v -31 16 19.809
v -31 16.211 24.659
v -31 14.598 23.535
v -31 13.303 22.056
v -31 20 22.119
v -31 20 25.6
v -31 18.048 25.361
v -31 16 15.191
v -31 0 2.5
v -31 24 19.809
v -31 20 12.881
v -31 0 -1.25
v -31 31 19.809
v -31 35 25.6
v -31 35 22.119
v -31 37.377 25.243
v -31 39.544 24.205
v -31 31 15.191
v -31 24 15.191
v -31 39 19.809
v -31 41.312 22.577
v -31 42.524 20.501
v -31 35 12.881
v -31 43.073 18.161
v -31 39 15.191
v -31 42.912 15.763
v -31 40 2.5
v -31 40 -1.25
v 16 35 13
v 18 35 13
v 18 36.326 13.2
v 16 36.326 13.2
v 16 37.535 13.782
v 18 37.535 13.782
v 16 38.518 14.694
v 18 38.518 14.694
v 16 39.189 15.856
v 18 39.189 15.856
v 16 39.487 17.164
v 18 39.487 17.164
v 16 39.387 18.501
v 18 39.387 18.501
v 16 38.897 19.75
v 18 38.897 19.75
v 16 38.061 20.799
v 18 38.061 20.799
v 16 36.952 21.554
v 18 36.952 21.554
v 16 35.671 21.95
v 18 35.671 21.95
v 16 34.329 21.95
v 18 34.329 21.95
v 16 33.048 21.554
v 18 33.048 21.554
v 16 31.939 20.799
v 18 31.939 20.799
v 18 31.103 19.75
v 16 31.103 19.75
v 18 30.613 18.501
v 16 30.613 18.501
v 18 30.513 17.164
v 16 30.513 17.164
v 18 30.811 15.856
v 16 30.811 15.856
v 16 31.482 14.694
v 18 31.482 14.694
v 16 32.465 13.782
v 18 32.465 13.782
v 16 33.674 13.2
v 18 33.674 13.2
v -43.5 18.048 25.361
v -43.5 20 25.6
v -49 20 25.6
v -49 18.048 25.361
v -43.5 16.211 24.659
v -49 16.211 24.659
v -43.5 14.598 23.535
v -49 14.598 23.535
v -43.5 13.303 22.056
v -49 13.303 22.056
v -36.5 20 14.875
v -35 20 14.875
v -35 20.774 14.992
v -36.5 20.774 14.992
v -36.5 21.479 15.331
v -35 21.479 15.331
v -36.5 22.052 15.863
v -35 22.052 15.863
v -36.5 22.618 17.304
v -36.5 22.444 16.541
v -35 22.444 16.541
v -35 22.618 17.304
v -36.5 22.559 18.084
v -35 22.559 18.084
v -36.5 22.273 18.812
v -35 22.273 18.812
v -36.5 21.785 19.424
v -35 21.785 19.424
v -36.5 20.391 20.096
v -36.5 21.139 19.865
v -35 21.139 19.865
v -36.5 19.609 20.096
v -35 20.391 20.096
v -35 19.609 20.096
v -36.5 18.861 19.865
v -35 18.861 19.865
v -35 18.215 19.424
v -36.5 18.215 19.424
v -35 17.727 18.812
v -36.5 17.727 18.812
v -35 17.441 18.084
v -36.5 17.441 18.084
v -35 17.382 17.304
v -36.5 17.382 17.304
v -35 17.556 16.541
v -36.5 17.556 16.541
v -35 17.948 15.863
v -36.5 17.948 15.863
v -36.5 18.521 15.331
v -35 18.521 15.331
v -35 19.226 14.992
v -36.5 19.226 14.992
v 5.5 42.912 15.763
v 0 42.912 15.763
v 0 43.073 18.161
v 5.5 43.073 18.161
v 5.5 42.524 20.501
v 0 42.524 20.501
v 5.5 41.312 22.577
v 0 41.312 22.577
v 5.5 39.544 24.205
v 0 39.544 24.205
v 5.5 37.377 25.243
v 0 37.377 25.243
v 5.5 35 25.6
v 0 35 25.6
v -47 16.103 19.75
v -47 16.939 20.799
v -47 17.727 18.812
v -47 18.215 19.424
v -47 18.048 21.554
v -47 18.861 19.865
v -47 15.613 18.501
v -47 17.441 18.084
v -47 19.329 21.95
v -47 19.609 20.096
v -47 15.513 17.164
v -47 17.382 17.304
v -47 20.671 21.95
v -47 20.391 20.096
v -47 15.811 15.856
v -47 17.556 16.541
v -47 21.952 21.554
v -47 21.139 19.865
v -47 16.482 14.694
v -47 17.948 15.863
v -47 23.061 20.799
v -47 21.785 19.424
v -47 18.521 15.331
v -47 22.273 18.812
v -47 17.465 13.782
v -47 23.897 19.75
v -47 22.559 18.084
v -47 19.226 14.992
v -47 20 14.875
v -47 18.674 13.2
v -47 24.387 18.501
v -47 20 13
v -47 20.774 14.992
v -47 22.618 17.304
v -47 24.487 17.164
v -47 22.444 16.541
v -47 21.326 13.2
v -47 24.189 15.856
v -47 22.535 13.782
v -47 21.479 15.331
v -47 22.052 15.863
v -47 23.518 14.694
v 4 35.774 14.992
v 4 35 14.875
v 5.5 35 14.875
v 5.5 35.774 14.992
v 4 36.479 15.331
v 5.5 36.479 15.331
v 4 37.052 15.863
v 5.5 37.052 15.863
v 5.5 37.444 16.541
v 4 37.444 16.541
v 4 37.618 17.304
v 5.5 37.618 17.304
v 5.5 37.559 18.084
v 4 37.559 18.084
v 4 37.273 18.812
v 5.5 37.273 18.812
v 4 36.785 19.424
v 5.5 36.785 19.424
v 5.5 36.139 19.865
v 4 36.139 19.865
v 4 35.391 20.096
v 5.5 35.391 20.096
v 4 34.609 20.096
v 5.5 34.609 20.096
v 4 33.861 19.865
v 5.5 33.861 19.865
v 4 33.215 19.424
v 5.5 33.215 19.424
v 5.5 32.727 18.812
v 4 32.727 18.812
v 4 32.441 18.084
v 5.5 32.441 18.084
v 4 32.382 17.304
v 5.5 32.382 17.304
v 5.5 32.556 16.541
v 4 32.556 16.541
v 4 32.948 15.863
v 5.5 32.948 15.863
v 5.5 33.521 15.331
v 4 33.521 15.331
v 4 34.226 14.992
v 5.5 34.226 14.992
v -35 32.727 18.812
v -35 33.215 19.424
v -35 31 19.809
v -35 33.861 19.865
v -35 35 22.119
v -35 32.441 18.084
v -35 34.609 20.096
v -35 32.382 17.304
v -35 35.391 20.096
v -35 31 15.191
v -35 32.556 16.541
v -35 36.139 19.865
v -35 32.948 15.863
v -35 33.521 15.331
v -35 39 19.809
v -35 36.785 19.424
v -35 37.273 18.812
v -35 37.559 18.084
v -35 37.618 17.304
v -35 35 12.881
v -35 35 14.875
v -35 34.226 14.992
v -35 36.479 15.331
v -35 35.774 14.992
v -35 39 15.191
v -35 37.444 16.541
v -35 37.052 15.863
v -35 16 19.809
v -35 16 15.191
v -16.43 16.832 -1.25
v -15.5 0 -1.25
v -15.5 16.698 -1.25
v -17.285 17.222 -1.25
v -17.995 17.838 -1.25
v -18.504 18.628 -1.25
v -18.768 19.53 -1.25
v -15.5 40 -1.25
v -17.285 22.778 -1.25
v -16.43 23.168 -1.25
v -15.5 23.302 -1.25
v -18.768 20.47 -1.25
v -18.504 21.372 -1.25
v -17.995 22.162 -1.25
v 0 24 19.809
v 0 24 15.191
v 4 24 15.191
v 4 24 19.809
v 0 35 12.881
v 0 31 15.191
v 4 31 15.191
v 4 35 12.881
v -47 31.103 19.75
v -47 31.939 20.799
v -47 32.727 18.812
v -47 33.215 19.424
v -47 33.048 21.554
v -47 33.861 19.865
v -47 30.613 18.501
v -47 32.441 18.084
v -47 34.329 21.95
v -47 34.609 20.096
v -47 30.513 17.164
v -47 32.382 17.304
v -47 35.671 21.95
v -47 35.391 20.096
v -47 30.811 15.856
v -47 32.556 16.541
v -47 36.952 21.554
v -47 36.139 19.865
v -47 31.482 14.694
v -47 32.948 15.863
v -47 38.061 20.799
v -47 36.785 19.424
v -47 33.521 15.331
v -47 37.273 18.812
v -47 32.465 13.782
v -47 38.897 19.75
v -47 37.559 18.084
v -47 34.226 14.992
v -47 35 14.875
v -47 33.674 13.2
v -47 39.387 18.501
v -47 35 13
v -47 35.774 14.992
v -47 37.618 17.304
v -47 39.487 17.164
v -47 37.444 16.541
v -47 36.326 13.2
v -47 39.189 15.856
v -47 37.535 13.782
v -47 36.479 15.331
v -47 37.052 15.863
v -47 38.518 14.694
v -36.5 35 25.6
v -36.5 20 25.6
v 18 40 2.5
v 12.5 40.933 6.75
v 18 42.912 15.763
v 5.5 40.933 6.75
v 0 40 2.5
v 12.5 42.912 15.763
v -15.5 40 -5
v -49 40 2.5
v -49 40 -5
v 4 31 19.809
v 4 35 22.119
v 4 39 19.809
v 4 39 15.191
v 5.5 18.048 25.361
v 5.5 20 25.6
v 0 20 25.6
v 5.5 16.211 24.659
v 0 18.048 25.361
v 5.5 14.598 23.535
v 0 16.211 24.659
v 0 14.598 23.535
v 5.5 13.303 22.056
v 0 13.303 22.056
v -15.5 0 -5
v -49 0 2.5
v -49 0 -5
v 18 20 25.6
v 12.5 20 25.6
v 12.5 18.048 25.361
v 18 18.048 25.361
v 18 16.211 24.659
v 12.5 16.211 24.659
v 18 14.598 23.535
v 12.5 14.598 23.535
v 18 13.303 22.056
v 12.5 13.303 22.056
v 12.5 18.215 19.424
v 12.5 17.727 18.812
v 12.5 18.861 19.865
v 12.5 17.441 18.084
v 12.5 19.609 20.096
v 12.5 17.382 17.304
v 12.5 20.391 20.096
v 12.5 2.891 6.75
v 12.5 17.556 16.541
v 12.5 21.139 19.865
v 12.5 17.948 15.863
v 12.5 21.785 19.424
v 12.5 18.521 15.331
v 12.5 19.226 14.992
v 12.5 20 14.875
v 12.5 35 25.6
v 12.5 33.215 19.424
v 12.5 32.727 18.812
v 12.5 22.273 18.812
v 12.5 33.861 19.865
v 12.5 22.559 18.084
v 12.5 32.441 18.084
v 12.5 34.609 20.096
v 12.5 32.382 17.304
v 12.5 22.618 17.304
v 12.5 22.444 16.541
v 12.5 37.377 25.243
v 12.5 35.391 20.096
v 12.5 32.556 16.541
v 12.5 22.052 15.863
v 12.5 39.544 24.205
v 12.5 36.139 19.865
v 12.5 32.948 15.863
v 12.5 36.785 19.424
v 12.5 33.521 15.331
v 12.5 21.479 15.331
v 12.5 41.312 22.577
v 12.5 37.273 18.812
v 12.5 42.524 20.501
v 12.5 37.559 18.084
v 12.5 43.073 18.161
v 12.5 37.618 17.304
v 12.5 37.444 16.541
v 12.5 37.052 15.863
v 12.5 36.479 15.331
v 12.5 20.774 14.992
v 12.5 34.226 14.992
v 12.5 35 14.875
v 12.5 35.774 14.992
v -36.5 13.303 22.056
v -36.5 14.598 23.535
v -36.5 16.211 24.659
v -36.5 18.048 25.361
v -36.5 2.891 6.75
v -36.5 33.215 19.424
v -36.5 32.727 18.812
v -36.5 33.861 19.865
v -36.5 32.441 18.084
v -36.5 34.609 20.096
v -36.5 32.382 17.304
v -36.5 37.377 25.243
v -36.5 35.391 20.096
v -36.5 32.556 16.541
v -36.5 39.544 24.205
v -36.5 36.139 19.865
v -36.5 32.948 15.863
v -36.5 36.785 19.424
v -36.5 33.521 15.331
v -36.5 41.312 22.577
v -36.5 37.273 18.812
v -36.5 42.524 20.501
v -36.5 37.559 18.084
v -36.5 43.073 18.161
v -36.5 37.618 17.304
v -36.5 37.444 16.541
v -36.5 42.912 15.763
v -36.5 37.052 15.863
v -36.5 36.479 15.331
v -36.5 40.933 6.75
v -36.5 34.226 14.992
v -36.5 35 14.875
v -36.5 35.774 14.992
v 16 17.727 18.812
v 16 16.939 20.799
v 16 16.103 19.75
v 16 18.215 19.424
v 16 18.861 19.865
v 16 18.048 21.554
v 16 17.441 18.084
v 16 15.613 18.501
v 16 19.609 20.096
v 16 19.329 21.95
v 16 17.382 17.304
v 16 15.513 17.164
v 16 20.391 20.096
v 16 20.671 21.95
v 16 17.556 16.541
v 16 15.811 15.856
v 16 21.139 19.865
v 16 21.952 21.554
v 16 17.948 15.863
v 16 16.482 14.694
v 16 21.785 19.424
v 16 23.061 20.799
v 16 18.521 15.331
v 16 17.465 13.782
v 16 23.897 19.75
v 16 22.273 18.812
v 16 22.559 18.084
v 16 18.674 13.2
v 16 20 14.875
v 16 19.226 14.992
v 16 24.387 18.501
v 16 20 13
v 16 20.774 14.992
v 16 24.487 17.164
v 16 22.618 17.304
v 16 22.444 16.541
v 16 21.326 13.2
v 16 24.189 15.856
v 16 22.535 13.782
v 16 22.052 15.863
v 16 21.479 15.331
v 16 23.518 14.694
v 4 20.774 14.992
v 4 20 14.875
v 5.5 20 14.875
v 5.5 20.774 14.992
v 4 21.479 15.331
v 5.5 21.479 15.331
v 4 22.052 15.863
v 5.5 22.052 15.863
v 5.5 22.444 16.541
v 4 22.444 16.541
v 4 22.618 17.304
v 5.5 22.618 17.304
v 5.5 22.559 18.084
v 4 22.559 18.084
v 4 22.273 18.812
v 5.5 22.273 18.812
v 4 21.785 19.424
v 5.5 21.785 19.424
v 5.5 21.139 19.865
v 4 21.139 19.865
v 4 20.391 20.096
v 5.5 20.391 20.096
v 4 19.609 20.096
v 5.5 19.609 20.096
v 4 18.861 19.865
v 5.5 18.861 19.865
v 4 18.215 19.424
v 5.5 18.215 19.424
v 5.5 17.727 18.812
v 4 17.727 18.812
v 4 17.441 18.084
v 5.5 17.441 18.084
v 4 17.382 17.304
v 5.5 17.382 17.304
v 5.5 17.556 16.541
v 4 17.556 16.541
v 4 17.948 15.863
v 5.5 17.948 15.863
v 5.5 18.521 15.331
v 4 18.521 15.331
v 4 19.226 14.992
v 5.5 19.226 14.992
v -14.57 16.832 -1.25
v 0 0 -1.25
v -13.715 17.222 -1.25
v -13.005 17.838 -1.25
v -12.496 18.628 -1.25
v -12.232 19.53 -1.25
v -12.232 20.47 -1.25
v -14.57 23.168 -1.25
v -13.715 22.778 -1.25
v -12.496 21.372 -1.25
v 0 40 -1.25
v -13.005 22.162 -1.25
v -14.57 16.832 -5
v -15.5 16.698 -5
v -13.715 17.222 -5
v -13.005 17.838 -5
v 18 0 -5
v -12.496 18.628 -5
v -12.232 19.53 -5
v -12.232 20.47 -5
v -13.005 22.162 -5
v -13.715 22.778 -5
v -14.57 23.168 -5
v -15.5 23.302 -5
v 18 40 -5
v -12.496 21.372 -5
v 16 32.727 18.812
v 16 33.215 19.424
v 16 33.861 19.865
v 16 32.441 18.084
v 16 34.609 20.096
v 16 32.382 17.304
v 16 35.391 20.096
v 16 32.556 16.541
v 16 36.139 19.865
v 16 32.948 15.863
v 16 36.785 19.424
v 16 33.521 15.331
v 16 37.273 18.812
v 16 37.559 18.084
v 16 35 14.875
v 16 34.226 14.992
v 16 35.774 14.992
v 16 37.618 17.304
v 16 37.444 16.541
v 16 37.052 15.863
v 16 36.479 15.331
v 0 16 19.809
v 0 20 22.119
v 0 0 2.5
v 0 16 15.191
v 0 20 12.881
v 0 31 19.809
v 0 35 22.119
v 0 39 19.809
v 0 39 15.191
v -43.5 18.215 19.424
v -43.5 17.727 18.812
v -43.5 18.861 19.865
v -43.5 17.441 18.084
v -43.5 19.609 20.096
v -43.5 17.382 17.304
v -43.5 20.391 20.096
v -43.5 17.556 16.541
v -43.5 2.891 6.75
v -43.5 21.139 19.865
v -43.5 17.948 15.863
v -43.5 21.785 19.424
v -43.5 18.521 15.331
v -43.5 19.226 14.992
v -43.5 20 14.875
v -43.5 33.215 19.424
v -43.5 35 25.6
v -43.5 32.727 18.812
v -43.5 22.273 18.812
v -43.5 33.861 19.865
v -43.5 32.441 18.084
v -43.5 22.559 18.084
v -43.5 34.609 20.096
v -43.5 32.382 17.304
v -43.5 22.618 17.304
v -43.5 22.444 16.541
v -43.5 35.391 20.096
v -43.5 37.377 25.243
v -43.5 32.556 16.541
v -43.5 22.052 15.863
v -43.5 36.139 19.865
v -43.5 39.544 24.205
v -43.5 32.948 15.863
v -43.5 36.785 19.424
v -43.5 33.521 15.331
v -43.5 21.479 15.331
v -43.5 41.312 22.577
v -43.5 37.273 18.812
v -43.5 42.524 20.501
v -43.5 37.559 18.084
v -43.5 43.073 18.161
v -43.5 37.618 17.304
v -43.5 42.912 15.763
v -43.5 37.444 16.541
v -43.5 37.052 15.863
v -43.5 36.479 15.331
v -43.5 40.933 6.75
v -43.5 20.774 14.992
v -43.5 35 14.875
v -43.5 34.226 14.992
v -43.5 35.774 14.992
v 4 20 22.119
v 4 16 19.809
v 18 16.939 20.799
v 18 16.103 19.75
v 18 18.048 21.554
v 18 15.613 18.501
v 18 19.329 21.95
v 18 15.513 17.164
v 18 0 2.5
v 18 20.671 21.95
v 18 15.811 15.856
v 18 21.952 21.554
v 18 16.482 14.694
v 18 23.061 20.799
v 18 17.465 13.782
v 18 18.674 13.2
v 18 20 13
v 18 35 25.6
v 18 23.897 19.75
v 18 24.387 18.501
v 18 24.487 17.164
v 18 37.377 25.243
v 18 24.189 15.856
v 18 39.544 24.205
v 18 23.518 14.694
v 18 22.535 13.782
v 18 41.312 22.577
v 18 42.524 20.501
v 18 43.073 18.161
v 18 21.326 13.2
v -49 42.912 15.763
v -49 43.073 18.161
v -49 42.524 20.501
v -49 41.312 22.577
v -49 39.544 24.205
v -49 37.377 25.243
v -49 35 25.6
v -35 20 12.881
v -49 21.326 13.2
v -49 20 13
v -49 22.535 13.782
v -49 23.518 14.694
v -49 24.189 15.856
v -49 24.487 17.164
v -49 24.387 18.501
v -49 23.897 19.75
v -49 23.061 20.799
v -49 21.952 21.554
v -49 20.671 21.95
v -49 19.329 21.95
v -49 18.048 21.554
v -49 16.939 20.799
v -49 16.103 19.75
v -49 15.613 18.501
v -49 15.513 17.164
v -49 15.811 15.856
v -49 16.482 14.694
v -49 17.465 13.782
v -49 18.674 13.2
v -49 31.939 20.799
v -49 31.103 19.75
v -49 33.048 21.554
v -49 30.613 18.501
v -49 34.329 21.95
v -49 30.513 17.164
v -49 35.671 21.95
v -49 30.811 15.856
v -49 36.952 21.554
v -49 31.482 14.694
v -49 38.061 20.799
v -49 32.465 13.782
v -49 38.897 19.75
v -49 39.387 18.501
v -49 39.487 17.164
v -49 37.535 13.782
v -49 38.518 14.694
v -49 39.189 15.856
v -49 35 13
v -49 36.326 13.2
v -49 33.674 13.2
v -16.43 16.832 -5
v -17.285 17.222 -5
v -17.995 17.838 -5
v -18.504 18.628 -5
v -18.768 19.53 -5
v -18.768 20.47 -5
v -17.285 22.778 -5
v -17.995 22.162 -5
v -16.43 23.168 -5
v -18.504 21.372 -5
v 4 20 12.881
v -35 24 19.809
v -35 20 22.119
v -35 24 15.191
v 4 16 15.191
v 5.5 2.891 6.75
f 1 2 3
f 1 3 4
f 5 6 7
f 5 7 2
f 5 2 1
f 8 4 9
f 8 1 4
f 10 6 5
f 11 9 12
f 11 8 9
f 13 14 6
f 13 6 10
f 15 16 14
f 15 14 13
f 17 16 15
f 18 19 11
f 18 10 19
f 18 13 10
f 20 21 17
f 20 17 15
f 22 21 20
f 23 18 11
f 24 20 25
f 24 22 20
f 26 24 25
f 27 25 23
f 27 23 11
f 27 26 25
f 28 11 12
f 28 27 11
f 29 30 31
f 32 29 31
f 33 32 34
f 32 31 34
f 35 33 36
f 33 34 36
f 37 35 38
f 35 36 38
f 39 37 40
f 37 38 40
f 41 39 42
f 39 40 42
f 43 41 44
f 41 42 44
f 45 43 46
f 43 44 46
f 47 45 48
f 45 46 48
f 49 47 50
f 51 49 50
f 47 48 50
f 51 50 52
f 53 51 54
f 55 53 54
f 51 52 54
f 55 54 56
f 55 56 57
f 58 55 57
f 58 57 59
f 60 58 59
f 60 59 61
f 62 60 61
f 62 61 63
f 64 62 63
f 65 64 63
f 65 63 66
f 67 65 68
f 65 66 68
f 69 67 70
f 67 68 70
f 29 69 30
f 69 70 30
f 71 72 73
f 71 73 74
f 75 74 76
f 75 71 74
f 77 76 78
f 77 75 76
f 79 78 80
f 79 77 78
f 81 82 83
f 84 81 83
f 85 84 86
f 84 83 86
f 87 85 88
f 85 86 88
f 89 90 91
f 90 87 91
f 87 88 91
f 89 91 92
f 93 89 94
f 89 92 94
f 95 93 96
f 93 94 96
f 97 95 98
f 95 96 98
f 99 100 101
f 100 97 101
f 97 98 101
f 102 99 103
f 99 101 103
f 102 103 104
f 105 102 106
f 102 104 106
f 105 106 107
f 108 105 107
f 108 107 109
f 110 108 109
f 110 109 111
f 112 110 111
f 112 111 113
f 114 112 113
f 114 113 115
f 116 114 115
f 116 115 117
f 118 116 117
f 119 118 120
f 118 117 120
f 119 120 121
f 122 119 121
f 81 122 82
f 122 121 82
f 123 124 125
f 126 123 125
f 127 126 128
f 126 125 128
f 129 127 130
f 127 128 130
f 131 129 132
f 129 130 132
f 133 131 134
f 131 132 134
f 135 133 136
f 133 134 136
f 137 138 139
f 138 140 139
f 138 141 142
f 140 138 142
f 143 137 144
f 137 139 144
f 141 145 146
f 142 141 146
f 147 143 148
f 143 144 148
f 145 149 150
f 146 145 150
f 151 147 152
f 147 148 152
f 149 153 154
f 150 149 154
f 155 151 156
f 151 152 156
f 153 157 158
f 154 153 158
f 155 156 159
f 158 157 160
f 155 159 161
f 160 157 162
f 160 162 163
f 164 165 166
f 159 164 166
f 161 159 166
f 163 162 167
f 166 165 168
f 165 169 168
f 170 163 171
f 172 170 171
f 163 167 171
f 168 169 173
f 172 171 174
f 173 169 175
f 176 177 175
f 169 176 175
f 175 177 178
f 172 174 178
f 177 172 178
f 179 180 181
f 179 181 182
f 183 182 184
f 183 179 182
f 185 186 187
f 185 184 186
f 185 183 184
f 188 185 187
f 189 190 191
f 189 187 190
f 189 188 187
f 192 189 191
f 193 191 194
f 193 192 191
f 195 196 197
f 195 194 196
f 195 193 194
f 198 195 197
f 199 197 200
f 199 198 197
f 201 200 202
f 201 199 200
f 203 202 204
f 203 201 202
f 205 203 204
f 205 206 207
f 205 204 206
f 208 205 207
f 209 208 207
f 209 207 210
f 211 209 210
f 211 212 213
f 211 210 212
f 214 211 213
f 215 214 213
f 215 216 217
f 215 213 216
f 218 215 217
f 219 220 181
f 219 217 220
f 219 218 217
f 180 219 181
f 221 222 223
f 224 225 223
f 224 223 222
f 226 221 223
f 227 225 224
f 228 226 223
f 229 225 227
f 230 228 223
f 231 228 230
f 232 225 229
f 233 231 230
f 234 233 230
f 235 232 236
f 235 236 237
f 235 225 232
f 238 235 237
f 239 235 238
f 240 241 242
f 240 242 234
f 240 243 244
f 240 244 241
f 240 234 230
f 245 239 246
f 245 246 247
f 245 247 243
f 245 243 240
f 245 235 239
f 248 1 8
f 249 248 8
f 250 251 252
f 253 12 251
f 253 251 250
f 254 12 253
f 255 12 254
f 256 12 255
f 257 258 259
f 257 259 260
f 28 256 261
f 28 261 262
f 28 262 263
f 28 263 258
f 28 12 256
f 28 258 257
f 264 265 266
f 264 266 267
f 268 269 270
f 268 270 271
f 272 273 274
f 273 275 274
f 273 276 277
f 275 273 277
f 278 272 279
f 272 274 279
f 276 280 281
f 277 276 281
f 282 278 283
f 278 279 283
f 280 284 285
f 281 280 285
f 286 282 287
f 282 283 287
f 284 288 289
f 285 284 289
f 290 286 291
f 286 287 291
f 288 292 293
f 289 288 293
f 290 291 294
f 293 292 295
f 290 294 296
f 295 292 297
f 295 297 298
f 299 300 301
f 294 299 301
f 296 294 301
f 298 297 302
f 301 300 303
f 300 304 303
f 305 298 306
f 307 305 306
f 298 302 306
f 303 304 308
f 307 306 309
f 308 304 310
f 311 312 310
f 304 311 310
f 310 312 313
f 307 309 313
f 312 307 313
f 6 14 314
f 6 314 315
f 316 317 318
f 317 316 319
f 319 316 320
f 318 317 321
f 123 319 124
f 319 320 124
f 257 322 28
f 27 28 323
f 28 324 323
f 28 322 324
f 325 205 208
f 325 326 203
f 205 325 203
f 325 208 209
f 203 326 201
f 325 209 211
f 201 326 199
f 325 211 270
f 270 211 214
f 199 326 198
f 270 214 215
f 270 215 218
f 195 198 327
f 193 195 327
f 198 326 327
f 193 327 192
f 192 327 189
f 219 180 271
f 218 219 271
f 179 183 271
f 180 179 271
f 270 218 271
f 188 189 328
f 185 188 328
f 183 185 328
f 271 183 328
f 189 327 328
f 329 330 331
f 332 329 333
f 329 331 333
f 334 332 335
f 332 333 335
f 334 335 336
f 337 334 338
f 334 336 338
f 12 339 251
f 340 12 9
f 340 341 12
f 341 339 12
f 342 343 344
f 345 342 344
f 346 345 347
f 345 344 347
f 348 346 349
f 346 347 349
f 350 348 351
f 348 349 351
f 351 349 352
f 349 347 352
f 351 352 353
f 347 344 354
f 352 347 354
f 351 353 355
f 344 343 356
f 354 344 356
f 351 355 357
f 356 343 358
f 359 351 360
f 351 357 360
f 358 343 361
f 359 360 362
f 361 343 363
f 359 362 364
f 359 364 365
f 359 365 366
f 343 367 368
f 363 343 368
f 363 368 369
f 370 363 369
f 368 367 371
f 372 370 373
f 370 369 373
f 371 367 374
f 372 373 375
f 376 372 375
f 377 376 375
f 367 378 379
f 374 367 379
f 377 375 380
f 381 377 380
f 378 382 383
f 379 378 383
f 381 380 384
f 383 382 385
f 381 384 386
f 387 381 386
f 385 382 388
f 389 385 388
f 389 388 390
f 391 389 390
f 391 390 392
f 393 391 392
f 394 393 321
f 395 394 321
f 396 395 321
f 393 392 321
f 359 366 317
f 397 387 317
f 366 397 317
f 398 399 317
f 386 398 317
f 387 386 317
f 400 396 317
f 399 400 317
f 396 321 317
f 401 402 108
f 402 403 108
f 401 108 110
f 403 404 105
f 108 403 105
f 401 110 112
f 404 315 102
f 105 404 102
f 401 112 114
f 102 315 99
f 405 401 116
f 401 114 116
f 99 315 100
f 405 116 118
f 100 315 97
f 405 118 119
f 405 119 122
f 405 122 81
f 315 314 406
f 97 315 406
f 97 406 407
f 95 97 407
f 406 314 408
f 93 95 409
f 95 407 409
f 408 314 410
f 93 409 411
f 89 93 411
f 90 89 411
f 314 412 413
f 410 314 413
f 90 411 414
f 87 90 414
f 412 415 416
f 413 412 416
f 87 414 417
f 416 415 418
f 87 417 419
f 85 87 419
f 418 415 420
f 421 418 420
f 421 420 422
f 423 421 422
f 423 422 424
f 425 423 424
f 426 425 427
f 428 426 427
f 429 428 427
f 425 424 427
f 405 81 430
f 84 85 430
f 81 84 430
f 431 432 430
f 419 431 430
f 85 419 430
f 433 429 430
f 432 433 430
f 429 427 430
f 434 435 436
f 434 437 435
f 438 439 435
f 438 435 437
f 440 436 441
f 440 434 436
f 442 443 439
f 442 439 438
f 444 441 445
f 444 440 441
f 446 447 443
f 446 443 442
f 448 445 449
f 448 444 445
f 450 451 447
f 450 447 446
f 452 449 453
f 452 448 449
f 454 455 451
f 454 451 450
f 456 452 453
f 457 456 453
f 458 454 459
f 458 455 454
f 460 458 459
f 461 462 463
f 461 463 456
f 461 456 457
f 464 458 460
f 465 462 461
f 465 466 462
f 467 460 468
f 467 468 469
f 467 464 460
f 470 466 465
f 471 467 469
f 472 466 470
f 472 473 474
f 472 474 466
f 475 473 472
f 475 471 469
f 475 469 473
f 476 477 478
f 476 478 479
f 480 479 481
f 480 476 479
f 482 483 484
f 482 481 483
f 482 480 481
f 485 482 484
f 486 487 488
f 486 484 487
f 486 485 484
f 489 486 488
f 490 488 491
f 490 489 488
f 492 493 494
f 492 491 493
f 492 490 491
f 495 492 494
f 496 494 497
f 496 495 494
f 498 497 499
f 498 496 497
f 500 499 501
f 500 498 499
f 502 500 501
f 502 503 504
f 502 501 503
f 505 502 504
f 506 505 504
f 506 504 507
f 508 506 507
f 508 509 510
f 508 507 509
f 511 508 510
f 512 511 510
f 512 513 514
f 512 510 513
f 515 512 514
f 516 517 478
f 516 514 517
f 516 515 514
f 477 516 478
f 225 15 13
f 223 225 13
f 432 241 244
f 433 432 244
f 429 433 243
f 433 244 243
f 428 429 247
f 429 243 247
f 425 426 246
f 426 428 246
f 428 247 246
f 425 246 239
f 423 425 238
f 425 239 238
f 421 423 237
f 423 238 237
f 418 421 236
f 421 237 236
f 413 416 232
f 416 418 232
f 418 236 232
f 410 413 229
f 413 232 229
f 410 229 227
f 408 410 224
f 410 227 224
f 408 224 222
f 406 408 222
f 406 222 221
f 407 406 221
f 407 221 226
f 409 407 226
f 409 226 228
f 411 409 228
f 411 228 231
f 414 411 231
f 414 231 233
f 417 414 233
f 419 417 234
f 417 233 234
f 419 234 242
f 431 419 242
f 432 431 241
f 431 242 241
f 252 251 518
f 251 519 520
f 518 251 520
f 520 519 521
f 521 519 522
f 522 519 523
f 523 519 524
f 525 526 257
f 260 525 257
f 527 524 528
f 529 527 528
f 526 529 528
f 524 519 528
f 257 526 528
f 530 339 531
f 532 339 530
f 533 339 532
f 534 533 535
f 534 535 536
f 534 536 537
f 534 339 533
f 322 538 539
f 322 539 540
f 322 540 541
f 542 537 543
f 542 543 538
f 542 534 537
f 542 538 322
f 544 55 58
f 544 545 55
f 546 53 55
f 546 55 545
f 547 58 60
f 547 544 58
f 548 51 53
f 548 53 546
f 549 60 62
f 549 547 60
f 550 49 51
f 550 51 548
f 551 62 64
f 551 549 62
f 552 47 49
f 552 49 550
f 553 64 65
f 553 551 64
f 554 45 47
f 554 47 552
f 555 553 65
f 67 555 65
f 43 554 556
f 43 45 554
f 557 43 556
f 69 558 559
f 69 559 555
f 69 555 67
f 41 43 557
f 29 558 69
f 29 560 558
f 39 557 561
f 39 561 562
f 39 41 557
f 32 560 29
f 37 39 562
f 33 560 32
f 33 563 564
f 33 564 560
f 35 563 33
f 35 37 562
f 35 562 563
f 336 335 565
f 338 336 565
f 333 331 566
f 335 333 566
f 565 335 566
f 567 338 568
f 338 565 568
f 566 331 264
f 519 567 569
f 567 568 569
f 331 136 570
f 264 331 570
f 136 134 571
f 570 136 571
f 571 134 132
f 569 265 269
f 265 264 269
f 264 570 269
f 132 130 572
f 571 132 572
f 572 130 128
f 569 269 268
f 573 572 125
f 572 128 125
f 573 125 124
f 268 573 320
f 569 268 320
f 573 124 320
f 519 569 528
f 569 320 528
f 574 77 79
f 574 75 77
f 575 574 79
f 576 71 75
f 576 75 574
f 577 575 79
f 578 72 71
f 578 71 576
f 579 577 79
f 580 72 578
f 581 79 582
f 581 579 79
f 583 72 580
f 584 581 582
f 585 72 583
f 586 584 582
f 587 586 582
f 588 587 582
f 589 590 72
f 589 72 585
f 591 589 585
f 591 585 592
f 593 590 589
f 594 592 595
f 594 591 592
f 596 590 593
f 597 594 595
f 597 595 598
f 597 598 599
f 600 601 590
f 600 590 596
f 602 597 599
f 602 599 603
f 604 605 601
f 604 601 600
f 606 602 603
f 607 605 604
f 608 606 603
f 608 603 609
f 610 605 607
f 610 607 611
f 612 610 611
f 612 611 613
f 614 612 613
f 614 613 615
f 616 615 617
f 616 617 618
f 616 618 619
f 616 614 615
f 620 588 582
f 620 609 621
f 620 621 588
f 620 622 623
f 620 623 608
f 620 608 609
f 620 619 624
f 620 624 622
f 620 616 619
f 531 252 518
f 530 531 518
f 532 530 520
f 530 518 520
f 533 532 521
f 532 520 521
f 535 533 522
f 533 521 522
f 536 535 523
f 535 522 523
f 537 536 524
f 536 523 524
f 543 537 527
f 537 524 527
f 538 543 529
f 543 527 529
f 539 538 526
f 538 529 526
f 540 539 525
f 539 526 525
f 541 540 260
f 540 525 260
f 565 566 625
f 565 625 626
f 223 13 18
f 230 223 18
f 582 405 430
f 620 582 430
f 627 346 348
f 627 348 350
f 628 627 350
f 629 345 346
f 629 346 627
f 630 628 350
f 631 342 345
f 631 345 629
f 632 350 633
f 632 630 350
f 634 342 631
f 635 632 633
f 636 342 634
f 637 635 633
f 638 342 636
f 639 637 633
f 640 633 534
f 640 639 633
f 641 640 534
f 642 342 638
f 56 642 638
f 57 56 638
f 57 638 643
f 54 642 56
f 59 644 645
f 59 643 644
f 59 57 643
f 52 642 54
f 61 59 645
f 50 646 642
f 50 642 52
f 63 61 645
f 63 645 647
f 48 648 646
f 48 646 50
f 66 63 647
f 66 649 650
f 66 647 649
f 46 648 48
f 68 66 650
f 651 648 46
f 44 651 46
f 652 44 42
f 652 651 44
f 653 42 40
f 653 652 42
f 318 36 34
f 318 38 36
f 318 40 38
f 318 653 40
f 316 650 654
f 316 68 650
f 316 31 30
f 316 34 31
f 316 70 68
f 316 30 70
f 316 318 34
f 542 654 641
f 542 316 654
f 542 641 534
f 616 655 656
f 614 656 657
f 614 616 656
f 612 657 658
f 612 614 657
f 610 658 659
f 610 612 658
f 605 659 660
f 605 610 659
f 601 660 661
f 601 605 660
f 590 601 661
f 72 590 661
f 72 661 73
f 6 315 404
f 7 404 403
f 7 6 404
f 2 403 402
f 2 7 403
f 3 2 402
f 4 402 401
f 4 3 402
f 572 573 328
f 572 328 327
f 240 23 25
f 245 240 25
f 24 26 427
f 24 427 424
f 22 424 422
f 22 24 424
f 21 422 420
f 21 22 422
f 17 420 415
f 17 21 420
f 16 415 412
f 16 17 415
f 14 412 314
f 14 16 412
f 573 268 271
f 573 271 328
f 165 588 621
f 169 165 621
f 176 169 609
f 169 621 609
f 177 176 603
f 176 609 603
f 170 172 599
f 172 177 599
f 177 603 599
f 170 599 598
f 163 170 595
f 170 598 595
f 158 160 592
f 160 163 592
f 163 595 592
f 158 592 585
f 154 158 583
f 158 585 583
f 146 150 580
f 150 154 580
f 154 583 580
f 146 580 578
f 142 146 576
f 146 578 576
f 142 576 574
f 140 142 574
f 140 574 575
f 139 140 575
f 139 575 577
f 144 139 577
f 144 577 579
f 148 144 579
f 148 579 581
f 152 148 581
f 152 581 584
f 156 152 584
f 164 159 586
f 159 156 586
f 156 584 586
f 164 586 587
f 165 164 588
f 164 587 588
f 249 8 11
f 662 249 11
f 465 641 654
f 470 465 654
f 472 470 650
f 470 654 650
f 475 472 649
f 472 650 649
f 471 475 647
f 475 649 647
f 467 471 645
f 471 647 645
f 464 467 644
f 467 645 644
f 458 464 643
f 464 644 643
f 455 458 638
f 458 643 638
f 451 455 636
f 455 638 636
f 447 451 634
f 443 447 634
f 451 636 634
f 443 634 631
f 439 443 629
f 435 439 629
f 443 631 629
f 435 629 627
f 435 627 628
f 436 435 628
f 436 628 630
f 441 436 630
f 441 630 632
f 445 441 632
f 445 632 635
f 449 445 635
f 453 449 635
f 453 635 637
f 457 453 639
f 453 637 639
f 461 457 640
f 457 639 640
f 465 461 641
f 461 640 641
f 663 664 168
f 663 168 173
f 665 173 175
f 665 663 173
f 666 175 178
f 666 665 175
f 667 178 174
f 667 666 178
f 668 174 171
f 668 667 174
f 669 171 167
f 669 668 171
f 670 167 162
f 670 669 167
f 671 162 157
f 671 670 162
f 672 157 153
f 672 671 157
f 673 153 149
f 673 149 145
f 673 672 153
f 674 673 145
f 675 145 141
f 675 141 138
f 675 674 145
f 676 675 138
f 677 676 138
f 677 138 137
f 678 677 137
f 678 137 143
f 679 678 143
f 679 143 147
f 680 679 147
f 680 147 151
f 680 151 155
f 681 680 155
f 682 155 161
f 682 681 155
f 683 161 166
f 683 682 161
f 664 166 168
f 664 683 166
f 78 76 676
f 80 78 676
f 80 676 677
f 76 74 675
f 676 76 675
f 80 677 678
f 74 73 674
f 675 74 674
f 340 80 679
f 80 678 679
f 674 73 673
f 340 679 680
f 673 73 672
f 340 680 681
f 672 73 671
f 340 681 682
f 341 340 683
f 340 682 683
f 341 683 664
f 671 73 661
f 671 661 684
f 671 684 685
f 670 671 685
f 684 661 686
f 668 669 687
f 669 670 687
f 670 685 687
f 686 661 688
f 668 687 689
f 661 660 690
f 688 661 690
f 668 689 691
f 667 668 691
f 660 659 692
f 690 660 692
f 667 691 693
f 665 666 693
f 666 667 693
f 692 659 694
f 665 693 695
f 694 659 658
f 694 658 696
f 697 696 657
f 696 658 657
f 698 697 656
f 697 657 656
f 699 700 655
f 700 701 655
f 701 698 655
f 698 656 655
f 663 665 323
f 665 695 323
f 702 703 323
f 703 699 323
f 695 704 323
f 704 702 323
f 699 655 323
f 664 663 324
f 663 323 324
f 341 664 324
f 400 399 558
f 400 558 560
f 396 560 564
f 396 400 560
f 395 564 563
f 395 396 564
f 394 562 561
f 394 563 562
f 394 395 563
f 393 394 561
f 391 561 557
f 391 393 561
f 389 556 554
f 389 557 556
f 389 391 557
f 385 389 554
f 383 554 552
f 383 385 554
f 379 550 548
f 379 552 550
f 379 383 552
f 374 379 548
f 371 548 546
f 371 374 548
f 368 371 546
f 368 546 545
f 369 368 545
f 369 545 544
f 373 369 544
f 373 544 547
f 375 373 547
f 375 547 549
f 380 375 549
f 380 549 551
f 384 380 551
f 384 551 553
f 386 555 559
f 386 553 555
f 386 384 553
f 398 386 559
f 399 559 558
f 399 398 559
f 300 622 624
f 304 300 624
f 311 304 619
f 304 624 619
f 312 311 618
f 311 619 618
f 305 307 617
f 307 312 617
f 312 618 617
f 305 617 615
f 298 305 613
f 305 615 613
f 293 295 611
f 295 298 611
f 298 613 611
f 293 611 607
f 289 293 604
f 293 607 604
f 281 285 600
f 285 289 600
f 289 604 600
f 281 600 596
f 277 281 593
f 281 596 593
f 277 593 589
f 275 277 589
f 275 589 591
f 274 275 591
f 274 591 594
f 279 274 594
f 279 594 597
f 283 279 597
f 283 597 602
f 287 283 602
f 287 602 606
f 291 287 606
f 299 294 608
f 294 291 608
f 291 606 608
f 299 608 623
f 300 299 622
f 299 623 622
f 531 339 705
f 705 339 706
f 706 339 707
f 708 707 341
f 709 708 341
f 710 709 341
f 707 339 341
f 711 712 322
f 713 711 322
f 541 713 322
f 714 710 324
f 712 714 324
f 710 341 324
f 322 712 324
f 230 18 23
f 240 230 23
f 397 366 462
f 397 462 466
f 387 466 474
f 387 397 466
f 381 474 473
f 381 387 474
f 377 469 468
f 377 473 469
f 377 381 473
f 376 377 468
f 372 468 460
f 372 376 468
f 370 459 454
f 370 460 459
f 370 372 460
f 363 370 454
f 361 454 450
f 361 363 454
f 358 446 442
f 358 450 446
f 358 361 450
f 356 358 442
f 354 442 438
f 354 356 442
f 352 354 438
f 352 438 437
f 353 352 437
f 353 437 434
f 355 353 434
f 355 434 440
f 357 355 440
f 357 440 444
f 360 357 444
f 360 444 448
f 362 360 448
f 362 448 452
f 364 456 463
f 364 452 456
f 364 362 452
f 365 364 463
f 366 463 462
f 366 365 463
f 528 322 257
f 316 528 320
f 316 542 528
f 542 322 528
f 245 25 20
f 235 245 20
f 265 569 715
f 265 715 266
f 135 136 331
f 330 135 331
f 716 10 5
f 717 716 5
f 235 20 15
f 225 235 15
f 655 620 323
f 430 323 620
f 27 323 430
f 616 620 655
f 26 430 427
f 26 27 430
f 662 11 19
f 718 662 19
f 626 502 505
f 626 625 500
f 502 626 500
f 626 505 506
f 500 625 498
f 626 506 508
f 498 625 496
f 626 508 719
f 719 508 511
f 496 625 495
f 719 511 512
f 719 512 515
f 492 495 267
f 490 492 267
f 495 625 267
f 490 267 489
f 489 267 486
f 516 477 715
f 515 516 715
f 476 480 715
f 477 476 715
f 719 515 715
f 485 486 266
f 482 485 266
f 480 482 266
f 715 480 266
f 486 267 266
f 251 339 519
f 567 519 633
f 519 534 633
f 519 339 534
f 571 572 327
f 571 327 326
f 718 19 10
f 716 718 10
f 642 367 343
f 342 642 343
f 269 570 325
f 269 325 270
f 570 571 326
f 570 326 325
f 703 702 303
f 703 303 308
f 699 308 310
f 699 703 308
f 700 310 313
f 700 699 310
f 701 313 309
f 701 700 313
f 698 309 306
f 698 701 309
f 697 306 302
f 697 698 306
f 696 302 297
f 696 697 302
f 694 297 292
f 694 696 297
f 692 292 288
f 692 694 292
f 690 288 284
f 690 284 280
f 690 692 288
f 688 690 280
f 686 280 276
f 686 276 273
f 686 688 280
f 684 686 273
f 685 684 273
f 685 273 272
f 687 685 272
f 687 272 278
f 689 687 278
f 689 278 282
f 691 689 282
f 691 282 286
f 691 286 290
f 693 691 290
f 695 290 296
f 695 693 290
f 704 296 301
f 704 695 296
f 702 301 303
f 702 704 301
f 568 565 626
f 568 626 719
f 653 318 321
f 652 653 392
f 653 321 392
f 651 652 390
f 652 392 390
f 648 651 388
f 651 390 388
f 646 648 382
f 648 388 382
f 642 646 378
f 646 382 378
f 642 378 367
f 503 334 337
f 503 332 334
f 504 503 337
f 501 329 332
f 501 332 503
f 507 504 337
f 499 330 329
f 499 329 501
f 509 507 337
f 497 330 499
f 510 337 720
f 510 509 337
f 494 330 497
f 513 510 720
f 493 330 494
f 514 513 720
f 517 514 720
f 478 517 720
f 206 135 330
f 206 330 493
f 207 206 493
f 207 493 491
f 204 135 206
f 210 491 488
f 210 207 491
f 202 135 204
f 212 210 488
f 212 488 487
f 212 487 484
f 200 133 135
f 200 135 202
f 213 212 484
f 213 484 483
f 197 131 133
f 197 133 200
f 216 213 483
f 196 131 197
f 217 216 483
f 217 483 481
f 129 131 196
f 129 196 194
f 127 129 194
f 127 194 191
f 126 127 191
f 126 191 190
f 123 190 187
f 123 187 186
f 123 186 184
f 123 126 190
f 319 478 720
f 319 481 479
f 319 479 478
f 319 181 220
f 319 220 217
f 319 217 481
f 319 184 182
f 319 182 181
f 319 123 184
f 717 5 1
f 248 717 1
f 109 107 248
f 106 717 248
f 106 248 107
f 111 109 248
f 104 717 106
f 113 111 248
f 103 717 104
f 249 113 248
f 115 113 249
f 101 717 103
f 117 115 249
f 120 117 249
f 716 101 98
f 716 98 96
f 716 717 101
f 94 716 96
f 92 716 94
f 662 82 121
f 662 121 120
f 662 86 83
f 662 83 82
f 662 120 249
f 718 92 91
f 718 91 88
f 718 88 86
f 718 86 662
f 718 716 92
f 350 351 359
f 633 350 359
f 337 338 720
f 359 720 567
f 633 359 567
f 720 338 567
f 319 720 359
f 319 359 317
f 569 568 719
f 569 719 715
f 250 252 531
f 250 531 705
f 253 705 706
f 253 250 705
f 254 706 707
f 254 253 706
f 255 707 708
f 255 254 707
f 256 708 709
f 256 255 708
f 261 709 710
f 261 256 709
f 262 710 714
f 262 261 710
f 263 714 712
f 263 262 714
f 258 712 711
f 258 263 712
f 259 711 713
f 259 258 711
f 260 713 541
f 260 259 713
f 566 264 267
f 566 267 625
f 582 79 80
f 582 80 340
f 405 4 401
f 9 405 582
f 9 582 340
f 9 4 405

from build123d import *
from build123d.topology import SkipClean

# Parameters (mm, degrees)
SKETCH1_R               = 2.625
BOSS_EXTRUDE1_DEPTH     = 18
SKETCH2_W               = 3.75
SKETCH2_H               = 40
BOSS_EXTRUDE2_DEPTH     = 15.5
CUT_EXTRUDE2_DEPTH      = 3.5
CUT_EXTRUDE2_DEPTH_BACK = 3.5
SKETCH4_W               = 26.185074211
SKETCH4_H               = 43.492971865
CUT_EXTRUDE3_DEPTH      = 3.75
CUT_EXTRUDE4_DEPTH      = 4
SKETCH6_R               = 4.5
CUT_EXTRUDE5_DEPTH      = 2


with BuildPart() as part:
    # Sketch1 → Boss-Extrude1 (new body)
    with BuildSketch(Plane(origin=(0, 0, 0), x_dir=(0, 0, -1), z_dir=(1, 0, 0))):
        with BuildLine():
            Line((0, 0), (5, 0))
            Line((5, 0), (5, 40))
            Line((5, 40), (0, 40))
            Line((0, 40), (-2.5, 40))
            Line((-2.5, 40), (-15.763202528, 42.911607583))
            ThreePointArc((-15.763202528, 42.911607583), (-22.576511621, 41.311816677), (-25.6, 35))
            Line((-25.6, 35), (-25.6, 20))
            ThreePointArc((-25.6, 20), (-24.659331675, 16.211336651), (-22.055809883, 13.302642588))
            Line((-22.055809883, 13.302642588), (-2.5, 0))
            Line((-2.5, 0), (0, 0))
        make_face()
        with Locations((-17.5, 35)):
            Circle(SKETCH1_R, mode=Mode.SUBTRACT)
        with Locations((-17.5, 20)):
            Circle(SKETCH1_R, mode=Mode.SUBTRACT)
    extrude(amount=BOSS_EXTRUDE1_DEPTH)

    # Sketch2 → Boss-Extrude2 (add)
    with BuildSketch(Plane.ZY):
        with Locations((-3.125, 20)):
            Rectangle(SKETCH2_W, SKETCH2_H)
    extrude(amount=BOSS_EXTRUDE2_DEPTH)

    # Sketch4 → Cut-Extrude2 (cut, two sides: drawn at the far end of the back side and taken through both)
    with BuildSketch(Plane(origin=(9, 0, 0), x_dir=(0, 0, -1), z_dir=(1, 0, 0)).offset(-CUT_EXTRUDE2_DEPTH_BACK)):
        with Locations((-19.842537105, 21.746485933)):
            Rectangle(SKETCH4_W, SKETCH4_H)
    extrude(amount=CUT_EXTRUDE2_DEPTH + CUT_EXTRUDE2_DEPTH_BACK, mode=Mode.SUBTRACT)

    # Sketch5 → Cut-Extrude3 (cut)
    with BuildSketch(Plane.XY.offset(-1.25)):
        with BuildLine():
            Line((-15.5, 23.302), (-15.5, 16.698))
            ThreePointArc((-15.5, 16.698), (-12.198, 20), (-15.5, 23.302))
        make_face()
    extrude(amount=-CUT_EXTRUDE3_DEPTH, mode=Mode.SUBTRACT)

    # Sketch3 → Cut-Extrude4 (cut)
    with BuildSketch(Plane(origin=(0, 0, 0), x_dir=(0, 0, -1), z_dir=(1, 0, 0))):
        Polygon((-12.881197846, 35), (-15.190598923, 39), (-19.809401077, 39), (-22.118802154, 35), (-19.809401077, 31), (-15.190598923, 31), align=None)
        Polygon((-12.881197846, 20), (-15.190598923, 24), (-19.809401077, 24), (-22.118802154, 20), (-19.809401077, 16), (-15.190598923, 16), align=None)
    extrude(amount=CUT_EXTRUDE4_DEPTH, mode=Mode.SUBTRACT)

    # Sketch6 → Cut-Extrude5 (cut)
    with BuildSketch(Plane(origin=(18, 0, 0), x_dir=(0, 0, -1), z_dir=(1, 0, 0))):
        with Locations((-17.5, 20)):
            Circle(SKETCH6_R)
        with Locations((-17.5, 35)):
            Circle(SKETCH6_R)
    extrude(amount=-CUT_EXTRUDE5_DEPTH, mode=Mode.SUBTRACT)

    # Mirror2: part across plane


with BuildPart() as part_1:
    with SkipClean():  # the faces are left unmerged after this step: merging them gives an invalid solid
        add(part.part)
        add(part.part.mirror(Plane(origin=(-15.5, 0, 0), x_dir=(0, 0, 1), z_dir=(1, 0, 0))))


solid = part_1.part
